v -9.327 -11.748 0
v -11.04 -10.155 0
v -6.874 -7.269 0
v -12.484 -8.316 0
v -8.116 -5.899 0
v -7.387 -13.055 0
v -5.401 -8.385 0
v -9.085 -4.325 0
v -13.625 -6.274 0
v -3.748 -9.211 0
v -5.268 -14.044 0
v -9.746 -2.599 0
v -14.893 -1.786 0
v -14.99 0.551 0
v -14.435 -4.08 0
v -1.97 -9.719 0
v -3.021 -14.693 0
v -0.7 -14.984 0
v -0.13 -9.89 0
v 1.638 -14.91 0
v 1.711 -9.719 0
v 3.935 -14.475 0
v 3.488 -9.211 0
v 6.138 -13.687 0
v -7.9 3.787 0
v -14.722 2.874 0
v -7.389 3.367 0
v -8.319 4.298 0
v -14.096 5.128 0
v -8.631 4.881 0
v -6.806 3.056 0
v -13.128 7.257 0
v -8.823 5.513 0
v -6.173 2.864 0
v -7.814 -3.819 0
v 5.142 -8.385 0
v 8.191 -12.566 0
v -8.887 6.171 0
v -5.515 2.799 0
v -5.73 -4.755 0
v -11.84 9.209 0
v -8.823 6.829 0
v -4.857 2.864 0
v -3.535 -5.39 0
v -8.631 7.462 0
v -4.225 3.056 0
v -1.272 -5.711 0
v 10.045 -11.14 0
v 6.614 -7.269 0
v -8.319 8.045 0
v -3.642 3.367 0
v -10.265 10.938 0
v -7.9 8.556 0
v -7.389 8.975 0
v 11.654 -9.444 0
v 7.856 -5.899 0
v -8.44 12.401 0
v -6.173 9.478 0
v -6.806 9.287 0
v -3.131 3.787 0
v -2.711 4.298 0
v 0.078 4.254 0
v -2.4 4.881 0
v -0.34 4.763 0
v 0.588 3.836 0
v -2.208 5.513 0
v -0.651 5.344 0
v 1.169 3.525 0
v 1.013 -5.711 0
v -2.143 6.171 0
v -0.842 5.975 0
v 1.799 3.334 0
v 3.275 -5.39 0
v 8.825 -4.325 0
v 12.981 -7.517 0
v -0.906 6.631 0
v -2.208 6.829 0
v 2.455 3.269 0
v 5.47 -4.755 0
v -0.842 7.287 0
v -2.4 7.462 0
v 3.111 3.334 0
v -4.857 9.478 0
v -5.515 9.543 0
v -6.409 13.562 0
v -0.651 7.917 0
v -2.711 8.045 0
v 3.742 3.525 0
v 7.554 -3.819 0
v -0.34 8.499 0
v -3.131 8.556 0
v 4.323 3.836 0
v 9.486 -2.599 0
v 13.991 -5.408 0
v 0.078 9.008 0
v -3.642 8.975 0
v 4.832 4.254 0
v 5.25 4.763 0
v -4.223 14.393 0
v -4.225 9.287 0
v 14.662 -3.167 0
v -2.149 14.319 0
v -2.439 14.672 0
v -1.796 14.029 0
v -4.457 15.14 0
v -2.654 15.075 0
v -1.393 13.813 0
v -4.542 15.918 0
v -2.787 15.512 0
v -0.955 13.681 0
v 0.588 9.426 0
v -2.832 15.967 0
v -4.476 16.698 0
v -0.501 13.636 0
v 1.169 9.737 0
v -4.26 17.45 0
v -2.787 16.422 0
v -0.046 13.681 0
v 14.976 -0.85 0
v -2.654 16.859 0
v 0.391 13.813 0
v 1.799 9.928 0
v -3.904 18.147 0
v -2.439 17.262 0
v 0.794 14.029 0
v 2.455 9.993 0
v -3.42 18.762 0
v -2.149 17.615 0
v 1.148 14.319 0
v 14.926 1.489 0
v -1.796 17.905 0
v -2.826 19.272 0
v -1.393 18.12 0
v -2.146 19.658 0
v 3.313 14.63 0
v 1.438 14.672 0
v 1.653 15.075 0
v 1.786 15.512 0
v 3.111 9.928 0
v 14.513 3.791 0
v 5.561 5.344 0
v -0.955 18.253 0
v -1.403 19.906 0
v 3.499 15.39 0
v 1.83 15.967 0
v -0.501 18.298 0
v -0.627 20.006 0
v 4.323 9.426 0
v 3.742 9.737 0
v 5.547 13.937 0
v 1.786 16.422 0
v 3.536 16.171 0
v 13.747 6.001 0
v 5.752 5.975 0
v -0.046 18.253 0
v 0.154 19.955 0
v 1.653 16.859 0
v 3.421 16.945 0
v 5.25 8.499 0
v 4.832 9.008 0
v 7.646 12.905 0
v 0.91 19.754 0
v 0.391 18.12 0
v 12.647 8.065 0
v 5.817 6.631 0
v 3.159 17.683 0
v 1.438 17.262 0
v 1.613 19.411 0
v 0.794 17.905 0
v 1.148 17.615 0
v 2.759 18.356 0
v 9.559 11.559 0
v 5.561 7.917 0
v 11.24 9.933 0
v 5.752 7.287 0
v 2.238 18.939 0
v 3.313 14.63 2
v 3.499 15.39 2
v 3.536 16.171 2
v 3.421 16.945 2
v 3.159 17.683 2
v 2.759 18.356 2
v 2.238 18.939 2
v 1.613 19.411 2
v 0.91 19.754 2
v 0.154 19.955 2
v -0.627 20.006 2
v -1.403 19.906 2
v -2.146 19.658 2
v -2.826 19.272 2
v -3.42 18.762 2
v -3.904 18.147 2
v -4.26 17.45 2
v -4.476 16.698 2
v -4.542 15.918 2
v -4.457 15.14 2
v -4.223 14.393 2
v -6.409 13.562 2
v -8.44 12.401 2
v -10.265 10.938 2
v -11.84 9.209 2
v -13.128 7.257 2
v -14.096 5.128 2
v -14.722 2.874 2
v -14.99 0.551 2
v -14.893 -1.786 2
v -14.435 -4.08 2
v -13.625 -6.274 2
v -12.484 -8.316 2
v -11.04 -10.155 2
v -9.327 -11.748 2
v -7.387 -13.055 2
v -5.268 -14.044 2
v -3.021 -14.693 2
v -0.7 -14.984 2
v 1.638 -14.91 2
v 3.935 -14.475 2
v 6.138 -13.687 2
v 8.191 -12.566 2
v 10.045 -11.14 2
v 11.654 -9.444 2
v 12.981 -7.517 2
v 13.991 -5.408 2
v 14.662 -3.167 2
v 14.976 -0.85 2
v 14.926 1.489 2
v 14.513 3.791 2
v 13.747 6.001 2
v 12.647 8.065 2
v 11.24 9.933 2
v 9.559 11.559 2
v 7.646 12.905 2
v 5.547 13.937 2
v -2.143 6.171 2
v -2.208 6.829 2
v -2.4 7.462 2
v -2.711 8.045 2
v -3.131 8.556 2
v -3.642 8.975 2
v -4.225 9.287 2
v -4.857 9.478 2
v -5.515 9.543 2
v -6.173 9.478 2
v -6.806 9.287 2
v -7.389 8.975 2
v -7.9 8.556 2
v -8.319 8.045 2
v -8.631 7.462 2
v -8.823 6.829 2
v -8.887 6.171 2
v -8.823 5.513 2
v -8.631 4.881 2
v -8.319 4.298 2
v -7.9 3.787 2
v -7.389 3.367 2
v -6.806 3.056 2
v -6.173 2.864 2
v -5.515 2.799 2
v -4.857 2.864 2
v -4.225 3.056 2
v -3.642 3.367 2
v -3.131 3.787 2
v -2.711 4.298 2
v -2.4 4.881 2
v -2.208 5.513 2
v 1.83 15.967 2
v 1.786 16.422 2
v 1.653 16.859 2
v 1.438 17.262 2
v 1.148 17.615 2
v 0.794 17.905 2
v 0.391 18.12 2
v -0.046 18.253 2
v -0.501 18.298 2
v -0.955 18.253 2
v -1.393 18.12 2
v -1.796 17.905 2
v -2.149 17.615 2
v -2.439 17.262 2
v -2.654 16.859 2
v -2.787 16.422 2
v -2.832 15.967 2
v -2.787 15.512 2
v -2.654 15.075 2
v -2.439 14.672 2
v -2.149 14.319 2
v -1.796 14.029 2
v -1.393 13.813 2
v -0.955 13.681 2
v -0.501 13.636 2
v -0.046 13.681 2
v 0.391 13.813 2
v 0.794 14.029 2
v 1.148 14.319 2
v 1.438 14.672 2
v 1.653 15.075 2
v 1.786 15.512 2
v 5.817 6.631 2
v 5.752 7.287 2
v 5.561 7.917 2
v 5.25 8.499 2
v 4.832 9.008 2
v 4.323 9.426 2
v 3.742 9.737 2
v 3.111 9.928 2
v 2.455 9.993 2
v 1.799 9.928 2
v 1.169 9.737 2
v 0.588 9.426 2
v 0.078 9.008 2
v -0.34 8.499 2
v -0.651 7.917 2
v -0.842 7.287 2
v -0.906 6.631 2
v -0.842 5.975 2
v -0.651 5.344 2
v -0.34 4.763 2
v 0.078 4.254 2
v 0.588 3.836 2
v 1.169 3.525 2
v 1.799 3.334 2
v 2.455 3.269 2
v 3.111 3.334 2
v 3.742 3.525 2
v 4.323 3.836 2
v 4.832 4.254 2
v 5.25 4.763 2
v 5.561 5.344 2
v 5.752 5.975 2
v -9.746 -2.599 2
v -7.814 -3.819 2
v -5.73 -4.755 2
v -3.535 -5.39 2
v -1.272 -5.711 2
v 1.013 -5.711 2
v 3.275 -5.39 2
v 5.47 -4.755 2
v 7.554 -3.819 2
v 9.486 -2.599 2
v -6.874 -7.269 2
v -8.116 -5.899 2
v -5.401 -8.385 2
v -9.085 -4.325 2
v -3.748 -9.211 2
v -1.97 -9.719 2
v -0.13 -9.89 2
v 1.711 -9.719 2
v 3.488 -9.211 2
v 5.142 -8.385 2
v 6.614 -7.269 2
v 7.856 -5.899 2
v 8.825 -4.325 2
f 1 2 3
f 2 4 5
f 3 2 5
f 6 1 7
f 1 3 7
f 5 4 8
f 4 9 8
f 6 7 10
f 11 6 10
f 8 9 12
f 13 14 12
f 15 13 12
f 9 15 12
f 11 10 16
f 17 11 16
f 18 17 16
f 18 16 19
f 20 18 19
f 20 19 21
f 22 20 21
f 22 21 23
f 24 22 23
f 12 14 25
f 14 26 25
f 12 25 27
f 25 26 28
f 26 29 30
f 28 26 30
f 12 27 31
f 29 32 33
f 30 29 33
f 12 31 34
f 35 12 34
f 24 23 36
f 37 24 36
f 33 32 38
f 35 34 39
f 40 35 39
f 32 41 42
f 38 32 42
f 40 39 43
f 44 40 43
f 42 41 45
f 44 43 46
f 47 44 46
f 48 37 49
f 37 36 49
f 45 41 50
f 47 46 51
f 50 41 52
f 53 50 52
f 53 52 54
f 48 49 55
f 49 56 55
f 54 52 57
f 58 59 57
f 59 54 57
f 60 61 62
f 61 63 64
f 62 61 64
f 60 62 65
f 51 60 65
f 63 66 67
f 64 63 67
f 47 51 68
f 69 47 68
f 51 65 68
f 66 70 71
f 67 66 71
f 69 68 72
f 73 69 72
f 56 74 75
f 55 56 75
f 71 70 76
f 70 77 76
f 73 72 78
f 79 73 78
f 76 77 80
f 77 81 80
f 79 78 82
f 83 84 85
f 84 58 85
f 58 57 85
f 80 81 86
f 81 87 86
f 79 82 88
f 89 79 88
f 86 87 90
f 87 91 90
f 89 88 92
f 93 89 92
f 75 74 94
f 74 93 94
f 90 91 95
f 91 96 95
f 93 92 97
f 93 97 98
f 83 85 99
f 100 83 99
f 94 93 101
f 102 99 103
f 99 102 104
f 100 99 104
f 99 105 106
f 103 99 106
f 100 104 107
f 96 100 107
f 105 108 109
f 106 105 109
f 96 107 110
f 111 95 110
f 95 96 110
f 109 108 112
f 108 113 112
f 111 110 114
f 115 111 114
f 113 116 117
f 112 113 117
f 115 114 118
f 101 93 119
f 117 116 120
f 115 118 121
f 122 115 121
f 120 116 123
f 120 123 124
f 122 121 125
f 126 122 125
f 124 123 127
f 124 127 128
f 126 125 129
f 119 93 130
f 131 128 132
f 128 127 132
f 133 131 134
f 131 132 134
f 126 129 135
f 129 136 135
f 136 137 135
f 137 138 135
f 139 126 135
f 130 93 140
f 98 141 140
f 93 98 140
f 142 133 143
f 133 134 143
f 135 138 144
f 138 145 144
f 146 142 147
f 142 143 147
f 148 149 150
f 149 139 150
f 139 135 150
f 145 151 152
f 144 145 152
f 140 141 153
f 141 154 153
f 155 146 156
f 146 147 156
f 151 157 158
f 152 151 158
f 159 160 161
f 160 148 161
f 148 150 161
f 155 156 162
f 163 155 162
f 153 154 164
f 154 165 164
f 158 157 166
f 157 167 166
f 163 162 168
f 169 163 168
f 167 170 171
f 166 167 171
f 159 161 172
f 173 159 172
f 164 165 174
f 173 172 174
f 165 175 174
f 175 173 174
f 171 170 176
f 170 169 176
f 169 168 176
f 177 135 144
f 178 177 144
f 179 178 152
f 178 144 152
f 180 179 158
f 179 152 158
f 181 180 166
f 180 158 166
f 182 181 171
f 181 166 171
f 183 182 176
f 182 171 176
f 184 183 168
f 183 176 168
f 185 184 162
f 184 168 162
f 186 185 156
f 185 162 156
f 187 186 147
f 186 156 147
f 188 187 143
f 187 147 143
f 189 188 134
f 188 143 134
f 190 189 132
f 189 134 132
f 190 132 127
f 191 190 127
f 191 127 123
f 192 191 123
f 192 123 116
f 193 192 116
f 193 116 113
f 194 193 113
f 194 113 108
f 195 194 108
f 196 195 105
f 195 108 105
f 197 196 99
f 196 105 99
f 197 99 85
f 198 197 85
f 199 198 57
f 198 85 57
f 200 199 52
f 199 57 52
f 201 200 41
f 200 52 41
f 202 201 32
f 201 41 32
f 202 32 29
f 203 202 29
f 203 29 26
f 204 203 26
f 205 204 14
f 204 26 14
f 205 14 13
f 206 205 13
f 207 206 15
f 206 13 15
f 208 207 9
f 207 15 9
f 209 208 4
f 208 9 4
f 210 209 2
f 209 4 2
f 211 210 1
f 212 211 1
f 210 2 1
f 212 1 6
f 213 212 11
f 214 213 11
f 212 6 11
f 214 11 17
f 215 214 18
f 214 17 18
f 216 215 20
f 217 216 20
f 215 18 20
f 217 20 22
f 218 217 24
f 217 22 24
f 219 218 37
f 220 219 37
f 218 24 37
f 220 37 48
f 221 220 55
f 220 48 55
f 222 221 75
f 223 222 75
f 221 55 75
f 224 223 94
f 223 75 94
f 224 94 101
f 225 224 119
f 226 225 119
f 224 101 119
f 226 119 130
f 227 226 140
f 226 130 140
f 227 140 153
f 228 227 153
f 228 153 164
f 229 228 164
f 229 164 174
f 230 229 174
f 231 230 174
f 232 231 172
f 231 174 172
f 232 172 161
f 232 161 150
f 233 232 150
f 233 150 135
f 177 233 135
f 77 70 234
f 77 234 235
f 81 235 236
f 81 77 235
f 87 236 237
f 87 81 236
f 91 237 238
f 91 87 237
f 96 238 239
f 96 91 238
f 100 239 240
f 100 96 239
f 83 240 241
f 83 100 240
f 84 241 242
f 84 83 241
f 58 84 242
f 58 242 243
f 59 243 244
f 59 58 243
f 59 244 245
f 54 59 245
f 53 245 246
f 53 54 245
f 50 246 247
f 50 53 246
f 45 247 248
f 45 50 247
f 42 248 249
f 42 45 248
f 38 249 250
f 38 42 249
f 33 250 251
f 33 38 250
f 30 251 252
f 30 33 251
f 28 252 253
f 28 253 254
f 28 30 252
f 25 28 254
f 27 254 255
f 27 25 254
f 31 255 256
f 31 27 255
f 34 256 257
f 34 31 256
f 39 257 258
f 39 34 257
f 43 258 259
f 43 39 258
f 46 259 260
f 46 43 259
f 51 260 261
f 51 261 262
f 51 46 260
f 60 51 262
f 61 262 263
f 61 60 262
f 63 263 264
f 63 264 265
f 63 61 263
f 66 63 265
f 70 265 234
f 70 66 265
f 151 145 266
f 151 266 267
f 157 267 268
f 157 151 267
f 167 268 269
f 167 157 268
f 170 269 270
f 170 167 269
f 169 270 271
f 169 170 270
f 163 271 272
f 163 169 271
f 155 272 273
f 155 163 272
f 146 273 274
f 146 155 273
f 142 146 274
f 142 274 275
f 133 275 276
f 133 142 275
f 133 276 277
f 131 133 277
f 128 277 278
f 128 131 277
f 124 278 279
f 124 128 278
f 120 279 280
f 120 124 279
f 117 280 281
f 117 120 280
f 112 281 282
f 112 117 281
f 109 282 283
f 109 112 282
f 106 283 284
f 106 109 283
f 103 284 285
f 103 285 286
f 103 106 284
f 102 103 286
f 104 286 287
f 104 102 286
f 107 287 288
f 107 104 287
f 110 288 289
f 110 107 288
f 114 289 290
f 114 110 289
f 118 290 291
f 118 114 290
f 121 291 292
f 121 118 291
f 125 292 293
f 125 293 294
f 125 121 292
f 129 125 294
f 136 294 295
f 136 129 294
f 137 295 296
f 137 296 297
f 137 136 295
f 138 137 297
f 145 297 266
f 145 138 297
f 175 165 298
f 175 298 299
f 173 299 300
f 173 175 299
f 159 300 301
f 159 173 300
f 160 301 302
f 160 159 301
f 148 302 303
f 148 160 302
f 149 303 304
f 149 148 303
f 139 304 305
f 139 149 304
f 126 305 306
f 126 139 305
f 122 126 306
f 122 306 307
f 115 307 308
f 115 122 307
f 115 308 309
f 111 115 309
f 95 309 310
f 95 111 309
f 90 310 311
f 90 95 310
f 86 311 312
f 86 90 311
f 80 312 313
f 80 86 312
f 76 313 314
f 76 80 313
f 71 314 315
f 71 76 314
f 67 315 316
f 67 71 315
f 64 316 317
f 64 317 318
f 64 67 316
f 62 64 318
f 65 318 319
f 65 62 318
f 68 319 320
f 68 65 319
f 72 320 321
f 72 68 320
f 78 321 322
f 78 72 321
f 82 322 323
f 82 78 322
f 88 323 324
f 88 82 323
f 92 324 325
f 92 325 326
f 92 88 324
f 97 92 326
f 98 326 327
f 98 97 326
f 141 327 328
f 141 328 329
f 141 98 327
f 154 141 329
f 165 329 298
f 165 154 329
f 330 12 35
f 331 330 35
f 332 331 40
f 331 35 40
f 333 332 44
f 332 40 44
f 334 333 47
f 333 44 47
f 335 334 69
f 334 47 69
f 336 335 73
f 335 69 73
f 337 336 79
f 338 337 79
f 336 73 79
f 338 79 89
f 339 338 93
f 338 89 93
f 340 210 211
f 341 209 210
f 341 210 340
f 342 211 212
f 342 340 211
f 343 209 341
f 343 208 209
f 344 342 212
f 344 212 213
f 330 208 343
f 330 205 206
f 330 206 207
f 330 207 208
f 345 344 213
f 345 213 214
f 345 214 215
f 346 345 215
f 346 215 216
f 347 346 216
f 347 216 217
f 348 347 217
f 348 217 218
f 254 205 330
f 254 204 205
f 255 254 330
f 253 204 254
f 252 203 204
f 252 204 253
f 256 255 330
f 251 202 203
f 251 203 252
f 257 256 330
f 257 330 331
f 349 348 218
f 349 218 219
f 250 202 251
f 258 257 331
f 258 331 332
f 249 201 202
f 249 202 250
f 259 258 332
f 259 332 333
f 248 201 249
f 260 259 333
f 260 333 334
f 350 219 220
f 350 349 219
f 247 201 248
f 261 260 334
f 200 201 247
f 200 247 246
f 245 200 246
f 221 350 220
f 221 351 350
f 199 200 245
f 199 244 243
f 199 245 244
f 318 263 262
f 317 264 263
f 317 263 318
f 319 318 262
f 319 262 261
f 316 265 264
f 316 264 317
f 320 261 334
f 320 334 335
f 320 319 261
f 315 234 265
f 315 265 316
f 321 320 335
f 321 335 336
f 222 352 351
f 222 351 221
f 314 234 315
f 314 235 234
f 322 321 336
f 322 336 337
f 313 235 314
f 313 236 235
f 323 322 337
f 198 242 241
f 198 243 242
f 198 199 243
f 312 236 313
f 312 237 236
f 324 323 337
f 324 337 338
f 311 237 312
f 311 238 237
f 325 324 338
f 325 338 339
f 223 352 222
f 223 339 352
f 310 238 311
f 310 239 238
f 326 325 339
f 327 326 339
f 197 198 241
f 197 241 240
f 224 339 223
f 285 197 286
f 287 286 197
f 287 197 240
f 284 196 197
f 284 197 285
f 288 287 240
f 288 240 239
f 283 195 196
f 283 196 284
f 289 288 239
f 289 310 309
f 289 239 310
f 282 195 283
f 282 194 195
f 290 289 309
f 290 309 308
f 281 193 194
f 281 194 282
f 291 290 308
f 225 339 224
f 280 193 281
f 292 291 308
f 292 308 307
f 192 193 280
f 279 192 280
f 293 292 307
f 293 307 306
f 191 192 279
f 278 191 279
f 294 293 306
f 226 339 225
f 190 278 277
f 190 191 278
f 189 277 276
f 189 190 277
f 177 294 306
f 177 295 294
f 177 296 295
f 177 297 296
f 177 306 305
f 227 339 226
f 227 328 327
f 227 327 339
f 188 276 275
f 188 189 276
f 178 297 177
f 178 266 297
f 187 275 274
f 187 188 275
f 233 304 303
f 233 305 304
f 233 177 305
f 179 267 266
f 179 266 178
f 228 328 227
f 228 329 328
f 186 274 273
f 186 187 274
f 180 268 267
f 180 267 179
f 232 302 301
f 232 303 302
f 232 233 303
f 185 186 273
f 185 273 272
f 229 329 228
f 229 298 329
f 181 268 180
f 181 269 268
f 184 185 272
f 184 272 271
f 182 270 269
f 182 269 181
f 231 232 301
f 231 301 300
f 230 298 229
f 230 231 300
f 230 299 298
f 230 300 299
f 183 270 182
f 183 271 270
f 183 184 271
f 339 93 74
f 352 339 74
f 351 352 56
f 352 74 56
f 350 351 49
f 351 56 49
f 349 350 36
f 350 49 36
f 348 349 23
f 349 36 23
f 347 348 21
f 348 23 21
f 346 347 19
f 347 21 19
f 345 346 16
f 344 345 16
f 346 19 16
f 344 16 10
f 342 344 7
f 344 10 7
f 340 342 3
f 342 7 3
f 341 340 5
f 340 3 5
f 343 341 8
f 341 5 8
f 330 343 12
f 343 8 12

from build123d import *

# Parameters (mm, degrees)
F0_R     = 3.37213
F0_R_2   = 2.330993
F0_R_3   = 3.361663
F1_DEPTH = 2


with BuildPart() as f1:
    # F0 (on Top) → F1 (new body)
    with BuildSketch(Plane.XY):
        with BuildLine():
            ThreePointArc((3.313187, 14.629518), (-0.627308, 20.006438), (-4.223204, 14.393212))
            ThreePointArc((-4.223204, 14.393212), (0.470099, -14.992632), (3.313187, 14.629518))
        make_face()
        with BuildLine():
            ThreePointArc((9.486387, -2.59901), (-0.12995, -9.889774), (-9.746287, -2.59901))
            ThreePointArc((-9.746287, -2.59901), (-0.12995, -5.751122), (9.486387, -2.59901))
        make_face(mode=Mode.SUBTRACT)
        with Locations((-5.515314, 6.171075)):
            Circle(F0_R, mode=Mode.SUBTRACT)
        with Locations((-0.500647, 15.966899)):
            Circle(F0_R_2, mode=Mode.SUBTRACT)
        with Locations((2.455175, 6.630911)):
            Circle(F0_R_3, mode=Mode.SUBTRACT)
    extrude(amount=F1_DEPTH)


solid = f1.part
